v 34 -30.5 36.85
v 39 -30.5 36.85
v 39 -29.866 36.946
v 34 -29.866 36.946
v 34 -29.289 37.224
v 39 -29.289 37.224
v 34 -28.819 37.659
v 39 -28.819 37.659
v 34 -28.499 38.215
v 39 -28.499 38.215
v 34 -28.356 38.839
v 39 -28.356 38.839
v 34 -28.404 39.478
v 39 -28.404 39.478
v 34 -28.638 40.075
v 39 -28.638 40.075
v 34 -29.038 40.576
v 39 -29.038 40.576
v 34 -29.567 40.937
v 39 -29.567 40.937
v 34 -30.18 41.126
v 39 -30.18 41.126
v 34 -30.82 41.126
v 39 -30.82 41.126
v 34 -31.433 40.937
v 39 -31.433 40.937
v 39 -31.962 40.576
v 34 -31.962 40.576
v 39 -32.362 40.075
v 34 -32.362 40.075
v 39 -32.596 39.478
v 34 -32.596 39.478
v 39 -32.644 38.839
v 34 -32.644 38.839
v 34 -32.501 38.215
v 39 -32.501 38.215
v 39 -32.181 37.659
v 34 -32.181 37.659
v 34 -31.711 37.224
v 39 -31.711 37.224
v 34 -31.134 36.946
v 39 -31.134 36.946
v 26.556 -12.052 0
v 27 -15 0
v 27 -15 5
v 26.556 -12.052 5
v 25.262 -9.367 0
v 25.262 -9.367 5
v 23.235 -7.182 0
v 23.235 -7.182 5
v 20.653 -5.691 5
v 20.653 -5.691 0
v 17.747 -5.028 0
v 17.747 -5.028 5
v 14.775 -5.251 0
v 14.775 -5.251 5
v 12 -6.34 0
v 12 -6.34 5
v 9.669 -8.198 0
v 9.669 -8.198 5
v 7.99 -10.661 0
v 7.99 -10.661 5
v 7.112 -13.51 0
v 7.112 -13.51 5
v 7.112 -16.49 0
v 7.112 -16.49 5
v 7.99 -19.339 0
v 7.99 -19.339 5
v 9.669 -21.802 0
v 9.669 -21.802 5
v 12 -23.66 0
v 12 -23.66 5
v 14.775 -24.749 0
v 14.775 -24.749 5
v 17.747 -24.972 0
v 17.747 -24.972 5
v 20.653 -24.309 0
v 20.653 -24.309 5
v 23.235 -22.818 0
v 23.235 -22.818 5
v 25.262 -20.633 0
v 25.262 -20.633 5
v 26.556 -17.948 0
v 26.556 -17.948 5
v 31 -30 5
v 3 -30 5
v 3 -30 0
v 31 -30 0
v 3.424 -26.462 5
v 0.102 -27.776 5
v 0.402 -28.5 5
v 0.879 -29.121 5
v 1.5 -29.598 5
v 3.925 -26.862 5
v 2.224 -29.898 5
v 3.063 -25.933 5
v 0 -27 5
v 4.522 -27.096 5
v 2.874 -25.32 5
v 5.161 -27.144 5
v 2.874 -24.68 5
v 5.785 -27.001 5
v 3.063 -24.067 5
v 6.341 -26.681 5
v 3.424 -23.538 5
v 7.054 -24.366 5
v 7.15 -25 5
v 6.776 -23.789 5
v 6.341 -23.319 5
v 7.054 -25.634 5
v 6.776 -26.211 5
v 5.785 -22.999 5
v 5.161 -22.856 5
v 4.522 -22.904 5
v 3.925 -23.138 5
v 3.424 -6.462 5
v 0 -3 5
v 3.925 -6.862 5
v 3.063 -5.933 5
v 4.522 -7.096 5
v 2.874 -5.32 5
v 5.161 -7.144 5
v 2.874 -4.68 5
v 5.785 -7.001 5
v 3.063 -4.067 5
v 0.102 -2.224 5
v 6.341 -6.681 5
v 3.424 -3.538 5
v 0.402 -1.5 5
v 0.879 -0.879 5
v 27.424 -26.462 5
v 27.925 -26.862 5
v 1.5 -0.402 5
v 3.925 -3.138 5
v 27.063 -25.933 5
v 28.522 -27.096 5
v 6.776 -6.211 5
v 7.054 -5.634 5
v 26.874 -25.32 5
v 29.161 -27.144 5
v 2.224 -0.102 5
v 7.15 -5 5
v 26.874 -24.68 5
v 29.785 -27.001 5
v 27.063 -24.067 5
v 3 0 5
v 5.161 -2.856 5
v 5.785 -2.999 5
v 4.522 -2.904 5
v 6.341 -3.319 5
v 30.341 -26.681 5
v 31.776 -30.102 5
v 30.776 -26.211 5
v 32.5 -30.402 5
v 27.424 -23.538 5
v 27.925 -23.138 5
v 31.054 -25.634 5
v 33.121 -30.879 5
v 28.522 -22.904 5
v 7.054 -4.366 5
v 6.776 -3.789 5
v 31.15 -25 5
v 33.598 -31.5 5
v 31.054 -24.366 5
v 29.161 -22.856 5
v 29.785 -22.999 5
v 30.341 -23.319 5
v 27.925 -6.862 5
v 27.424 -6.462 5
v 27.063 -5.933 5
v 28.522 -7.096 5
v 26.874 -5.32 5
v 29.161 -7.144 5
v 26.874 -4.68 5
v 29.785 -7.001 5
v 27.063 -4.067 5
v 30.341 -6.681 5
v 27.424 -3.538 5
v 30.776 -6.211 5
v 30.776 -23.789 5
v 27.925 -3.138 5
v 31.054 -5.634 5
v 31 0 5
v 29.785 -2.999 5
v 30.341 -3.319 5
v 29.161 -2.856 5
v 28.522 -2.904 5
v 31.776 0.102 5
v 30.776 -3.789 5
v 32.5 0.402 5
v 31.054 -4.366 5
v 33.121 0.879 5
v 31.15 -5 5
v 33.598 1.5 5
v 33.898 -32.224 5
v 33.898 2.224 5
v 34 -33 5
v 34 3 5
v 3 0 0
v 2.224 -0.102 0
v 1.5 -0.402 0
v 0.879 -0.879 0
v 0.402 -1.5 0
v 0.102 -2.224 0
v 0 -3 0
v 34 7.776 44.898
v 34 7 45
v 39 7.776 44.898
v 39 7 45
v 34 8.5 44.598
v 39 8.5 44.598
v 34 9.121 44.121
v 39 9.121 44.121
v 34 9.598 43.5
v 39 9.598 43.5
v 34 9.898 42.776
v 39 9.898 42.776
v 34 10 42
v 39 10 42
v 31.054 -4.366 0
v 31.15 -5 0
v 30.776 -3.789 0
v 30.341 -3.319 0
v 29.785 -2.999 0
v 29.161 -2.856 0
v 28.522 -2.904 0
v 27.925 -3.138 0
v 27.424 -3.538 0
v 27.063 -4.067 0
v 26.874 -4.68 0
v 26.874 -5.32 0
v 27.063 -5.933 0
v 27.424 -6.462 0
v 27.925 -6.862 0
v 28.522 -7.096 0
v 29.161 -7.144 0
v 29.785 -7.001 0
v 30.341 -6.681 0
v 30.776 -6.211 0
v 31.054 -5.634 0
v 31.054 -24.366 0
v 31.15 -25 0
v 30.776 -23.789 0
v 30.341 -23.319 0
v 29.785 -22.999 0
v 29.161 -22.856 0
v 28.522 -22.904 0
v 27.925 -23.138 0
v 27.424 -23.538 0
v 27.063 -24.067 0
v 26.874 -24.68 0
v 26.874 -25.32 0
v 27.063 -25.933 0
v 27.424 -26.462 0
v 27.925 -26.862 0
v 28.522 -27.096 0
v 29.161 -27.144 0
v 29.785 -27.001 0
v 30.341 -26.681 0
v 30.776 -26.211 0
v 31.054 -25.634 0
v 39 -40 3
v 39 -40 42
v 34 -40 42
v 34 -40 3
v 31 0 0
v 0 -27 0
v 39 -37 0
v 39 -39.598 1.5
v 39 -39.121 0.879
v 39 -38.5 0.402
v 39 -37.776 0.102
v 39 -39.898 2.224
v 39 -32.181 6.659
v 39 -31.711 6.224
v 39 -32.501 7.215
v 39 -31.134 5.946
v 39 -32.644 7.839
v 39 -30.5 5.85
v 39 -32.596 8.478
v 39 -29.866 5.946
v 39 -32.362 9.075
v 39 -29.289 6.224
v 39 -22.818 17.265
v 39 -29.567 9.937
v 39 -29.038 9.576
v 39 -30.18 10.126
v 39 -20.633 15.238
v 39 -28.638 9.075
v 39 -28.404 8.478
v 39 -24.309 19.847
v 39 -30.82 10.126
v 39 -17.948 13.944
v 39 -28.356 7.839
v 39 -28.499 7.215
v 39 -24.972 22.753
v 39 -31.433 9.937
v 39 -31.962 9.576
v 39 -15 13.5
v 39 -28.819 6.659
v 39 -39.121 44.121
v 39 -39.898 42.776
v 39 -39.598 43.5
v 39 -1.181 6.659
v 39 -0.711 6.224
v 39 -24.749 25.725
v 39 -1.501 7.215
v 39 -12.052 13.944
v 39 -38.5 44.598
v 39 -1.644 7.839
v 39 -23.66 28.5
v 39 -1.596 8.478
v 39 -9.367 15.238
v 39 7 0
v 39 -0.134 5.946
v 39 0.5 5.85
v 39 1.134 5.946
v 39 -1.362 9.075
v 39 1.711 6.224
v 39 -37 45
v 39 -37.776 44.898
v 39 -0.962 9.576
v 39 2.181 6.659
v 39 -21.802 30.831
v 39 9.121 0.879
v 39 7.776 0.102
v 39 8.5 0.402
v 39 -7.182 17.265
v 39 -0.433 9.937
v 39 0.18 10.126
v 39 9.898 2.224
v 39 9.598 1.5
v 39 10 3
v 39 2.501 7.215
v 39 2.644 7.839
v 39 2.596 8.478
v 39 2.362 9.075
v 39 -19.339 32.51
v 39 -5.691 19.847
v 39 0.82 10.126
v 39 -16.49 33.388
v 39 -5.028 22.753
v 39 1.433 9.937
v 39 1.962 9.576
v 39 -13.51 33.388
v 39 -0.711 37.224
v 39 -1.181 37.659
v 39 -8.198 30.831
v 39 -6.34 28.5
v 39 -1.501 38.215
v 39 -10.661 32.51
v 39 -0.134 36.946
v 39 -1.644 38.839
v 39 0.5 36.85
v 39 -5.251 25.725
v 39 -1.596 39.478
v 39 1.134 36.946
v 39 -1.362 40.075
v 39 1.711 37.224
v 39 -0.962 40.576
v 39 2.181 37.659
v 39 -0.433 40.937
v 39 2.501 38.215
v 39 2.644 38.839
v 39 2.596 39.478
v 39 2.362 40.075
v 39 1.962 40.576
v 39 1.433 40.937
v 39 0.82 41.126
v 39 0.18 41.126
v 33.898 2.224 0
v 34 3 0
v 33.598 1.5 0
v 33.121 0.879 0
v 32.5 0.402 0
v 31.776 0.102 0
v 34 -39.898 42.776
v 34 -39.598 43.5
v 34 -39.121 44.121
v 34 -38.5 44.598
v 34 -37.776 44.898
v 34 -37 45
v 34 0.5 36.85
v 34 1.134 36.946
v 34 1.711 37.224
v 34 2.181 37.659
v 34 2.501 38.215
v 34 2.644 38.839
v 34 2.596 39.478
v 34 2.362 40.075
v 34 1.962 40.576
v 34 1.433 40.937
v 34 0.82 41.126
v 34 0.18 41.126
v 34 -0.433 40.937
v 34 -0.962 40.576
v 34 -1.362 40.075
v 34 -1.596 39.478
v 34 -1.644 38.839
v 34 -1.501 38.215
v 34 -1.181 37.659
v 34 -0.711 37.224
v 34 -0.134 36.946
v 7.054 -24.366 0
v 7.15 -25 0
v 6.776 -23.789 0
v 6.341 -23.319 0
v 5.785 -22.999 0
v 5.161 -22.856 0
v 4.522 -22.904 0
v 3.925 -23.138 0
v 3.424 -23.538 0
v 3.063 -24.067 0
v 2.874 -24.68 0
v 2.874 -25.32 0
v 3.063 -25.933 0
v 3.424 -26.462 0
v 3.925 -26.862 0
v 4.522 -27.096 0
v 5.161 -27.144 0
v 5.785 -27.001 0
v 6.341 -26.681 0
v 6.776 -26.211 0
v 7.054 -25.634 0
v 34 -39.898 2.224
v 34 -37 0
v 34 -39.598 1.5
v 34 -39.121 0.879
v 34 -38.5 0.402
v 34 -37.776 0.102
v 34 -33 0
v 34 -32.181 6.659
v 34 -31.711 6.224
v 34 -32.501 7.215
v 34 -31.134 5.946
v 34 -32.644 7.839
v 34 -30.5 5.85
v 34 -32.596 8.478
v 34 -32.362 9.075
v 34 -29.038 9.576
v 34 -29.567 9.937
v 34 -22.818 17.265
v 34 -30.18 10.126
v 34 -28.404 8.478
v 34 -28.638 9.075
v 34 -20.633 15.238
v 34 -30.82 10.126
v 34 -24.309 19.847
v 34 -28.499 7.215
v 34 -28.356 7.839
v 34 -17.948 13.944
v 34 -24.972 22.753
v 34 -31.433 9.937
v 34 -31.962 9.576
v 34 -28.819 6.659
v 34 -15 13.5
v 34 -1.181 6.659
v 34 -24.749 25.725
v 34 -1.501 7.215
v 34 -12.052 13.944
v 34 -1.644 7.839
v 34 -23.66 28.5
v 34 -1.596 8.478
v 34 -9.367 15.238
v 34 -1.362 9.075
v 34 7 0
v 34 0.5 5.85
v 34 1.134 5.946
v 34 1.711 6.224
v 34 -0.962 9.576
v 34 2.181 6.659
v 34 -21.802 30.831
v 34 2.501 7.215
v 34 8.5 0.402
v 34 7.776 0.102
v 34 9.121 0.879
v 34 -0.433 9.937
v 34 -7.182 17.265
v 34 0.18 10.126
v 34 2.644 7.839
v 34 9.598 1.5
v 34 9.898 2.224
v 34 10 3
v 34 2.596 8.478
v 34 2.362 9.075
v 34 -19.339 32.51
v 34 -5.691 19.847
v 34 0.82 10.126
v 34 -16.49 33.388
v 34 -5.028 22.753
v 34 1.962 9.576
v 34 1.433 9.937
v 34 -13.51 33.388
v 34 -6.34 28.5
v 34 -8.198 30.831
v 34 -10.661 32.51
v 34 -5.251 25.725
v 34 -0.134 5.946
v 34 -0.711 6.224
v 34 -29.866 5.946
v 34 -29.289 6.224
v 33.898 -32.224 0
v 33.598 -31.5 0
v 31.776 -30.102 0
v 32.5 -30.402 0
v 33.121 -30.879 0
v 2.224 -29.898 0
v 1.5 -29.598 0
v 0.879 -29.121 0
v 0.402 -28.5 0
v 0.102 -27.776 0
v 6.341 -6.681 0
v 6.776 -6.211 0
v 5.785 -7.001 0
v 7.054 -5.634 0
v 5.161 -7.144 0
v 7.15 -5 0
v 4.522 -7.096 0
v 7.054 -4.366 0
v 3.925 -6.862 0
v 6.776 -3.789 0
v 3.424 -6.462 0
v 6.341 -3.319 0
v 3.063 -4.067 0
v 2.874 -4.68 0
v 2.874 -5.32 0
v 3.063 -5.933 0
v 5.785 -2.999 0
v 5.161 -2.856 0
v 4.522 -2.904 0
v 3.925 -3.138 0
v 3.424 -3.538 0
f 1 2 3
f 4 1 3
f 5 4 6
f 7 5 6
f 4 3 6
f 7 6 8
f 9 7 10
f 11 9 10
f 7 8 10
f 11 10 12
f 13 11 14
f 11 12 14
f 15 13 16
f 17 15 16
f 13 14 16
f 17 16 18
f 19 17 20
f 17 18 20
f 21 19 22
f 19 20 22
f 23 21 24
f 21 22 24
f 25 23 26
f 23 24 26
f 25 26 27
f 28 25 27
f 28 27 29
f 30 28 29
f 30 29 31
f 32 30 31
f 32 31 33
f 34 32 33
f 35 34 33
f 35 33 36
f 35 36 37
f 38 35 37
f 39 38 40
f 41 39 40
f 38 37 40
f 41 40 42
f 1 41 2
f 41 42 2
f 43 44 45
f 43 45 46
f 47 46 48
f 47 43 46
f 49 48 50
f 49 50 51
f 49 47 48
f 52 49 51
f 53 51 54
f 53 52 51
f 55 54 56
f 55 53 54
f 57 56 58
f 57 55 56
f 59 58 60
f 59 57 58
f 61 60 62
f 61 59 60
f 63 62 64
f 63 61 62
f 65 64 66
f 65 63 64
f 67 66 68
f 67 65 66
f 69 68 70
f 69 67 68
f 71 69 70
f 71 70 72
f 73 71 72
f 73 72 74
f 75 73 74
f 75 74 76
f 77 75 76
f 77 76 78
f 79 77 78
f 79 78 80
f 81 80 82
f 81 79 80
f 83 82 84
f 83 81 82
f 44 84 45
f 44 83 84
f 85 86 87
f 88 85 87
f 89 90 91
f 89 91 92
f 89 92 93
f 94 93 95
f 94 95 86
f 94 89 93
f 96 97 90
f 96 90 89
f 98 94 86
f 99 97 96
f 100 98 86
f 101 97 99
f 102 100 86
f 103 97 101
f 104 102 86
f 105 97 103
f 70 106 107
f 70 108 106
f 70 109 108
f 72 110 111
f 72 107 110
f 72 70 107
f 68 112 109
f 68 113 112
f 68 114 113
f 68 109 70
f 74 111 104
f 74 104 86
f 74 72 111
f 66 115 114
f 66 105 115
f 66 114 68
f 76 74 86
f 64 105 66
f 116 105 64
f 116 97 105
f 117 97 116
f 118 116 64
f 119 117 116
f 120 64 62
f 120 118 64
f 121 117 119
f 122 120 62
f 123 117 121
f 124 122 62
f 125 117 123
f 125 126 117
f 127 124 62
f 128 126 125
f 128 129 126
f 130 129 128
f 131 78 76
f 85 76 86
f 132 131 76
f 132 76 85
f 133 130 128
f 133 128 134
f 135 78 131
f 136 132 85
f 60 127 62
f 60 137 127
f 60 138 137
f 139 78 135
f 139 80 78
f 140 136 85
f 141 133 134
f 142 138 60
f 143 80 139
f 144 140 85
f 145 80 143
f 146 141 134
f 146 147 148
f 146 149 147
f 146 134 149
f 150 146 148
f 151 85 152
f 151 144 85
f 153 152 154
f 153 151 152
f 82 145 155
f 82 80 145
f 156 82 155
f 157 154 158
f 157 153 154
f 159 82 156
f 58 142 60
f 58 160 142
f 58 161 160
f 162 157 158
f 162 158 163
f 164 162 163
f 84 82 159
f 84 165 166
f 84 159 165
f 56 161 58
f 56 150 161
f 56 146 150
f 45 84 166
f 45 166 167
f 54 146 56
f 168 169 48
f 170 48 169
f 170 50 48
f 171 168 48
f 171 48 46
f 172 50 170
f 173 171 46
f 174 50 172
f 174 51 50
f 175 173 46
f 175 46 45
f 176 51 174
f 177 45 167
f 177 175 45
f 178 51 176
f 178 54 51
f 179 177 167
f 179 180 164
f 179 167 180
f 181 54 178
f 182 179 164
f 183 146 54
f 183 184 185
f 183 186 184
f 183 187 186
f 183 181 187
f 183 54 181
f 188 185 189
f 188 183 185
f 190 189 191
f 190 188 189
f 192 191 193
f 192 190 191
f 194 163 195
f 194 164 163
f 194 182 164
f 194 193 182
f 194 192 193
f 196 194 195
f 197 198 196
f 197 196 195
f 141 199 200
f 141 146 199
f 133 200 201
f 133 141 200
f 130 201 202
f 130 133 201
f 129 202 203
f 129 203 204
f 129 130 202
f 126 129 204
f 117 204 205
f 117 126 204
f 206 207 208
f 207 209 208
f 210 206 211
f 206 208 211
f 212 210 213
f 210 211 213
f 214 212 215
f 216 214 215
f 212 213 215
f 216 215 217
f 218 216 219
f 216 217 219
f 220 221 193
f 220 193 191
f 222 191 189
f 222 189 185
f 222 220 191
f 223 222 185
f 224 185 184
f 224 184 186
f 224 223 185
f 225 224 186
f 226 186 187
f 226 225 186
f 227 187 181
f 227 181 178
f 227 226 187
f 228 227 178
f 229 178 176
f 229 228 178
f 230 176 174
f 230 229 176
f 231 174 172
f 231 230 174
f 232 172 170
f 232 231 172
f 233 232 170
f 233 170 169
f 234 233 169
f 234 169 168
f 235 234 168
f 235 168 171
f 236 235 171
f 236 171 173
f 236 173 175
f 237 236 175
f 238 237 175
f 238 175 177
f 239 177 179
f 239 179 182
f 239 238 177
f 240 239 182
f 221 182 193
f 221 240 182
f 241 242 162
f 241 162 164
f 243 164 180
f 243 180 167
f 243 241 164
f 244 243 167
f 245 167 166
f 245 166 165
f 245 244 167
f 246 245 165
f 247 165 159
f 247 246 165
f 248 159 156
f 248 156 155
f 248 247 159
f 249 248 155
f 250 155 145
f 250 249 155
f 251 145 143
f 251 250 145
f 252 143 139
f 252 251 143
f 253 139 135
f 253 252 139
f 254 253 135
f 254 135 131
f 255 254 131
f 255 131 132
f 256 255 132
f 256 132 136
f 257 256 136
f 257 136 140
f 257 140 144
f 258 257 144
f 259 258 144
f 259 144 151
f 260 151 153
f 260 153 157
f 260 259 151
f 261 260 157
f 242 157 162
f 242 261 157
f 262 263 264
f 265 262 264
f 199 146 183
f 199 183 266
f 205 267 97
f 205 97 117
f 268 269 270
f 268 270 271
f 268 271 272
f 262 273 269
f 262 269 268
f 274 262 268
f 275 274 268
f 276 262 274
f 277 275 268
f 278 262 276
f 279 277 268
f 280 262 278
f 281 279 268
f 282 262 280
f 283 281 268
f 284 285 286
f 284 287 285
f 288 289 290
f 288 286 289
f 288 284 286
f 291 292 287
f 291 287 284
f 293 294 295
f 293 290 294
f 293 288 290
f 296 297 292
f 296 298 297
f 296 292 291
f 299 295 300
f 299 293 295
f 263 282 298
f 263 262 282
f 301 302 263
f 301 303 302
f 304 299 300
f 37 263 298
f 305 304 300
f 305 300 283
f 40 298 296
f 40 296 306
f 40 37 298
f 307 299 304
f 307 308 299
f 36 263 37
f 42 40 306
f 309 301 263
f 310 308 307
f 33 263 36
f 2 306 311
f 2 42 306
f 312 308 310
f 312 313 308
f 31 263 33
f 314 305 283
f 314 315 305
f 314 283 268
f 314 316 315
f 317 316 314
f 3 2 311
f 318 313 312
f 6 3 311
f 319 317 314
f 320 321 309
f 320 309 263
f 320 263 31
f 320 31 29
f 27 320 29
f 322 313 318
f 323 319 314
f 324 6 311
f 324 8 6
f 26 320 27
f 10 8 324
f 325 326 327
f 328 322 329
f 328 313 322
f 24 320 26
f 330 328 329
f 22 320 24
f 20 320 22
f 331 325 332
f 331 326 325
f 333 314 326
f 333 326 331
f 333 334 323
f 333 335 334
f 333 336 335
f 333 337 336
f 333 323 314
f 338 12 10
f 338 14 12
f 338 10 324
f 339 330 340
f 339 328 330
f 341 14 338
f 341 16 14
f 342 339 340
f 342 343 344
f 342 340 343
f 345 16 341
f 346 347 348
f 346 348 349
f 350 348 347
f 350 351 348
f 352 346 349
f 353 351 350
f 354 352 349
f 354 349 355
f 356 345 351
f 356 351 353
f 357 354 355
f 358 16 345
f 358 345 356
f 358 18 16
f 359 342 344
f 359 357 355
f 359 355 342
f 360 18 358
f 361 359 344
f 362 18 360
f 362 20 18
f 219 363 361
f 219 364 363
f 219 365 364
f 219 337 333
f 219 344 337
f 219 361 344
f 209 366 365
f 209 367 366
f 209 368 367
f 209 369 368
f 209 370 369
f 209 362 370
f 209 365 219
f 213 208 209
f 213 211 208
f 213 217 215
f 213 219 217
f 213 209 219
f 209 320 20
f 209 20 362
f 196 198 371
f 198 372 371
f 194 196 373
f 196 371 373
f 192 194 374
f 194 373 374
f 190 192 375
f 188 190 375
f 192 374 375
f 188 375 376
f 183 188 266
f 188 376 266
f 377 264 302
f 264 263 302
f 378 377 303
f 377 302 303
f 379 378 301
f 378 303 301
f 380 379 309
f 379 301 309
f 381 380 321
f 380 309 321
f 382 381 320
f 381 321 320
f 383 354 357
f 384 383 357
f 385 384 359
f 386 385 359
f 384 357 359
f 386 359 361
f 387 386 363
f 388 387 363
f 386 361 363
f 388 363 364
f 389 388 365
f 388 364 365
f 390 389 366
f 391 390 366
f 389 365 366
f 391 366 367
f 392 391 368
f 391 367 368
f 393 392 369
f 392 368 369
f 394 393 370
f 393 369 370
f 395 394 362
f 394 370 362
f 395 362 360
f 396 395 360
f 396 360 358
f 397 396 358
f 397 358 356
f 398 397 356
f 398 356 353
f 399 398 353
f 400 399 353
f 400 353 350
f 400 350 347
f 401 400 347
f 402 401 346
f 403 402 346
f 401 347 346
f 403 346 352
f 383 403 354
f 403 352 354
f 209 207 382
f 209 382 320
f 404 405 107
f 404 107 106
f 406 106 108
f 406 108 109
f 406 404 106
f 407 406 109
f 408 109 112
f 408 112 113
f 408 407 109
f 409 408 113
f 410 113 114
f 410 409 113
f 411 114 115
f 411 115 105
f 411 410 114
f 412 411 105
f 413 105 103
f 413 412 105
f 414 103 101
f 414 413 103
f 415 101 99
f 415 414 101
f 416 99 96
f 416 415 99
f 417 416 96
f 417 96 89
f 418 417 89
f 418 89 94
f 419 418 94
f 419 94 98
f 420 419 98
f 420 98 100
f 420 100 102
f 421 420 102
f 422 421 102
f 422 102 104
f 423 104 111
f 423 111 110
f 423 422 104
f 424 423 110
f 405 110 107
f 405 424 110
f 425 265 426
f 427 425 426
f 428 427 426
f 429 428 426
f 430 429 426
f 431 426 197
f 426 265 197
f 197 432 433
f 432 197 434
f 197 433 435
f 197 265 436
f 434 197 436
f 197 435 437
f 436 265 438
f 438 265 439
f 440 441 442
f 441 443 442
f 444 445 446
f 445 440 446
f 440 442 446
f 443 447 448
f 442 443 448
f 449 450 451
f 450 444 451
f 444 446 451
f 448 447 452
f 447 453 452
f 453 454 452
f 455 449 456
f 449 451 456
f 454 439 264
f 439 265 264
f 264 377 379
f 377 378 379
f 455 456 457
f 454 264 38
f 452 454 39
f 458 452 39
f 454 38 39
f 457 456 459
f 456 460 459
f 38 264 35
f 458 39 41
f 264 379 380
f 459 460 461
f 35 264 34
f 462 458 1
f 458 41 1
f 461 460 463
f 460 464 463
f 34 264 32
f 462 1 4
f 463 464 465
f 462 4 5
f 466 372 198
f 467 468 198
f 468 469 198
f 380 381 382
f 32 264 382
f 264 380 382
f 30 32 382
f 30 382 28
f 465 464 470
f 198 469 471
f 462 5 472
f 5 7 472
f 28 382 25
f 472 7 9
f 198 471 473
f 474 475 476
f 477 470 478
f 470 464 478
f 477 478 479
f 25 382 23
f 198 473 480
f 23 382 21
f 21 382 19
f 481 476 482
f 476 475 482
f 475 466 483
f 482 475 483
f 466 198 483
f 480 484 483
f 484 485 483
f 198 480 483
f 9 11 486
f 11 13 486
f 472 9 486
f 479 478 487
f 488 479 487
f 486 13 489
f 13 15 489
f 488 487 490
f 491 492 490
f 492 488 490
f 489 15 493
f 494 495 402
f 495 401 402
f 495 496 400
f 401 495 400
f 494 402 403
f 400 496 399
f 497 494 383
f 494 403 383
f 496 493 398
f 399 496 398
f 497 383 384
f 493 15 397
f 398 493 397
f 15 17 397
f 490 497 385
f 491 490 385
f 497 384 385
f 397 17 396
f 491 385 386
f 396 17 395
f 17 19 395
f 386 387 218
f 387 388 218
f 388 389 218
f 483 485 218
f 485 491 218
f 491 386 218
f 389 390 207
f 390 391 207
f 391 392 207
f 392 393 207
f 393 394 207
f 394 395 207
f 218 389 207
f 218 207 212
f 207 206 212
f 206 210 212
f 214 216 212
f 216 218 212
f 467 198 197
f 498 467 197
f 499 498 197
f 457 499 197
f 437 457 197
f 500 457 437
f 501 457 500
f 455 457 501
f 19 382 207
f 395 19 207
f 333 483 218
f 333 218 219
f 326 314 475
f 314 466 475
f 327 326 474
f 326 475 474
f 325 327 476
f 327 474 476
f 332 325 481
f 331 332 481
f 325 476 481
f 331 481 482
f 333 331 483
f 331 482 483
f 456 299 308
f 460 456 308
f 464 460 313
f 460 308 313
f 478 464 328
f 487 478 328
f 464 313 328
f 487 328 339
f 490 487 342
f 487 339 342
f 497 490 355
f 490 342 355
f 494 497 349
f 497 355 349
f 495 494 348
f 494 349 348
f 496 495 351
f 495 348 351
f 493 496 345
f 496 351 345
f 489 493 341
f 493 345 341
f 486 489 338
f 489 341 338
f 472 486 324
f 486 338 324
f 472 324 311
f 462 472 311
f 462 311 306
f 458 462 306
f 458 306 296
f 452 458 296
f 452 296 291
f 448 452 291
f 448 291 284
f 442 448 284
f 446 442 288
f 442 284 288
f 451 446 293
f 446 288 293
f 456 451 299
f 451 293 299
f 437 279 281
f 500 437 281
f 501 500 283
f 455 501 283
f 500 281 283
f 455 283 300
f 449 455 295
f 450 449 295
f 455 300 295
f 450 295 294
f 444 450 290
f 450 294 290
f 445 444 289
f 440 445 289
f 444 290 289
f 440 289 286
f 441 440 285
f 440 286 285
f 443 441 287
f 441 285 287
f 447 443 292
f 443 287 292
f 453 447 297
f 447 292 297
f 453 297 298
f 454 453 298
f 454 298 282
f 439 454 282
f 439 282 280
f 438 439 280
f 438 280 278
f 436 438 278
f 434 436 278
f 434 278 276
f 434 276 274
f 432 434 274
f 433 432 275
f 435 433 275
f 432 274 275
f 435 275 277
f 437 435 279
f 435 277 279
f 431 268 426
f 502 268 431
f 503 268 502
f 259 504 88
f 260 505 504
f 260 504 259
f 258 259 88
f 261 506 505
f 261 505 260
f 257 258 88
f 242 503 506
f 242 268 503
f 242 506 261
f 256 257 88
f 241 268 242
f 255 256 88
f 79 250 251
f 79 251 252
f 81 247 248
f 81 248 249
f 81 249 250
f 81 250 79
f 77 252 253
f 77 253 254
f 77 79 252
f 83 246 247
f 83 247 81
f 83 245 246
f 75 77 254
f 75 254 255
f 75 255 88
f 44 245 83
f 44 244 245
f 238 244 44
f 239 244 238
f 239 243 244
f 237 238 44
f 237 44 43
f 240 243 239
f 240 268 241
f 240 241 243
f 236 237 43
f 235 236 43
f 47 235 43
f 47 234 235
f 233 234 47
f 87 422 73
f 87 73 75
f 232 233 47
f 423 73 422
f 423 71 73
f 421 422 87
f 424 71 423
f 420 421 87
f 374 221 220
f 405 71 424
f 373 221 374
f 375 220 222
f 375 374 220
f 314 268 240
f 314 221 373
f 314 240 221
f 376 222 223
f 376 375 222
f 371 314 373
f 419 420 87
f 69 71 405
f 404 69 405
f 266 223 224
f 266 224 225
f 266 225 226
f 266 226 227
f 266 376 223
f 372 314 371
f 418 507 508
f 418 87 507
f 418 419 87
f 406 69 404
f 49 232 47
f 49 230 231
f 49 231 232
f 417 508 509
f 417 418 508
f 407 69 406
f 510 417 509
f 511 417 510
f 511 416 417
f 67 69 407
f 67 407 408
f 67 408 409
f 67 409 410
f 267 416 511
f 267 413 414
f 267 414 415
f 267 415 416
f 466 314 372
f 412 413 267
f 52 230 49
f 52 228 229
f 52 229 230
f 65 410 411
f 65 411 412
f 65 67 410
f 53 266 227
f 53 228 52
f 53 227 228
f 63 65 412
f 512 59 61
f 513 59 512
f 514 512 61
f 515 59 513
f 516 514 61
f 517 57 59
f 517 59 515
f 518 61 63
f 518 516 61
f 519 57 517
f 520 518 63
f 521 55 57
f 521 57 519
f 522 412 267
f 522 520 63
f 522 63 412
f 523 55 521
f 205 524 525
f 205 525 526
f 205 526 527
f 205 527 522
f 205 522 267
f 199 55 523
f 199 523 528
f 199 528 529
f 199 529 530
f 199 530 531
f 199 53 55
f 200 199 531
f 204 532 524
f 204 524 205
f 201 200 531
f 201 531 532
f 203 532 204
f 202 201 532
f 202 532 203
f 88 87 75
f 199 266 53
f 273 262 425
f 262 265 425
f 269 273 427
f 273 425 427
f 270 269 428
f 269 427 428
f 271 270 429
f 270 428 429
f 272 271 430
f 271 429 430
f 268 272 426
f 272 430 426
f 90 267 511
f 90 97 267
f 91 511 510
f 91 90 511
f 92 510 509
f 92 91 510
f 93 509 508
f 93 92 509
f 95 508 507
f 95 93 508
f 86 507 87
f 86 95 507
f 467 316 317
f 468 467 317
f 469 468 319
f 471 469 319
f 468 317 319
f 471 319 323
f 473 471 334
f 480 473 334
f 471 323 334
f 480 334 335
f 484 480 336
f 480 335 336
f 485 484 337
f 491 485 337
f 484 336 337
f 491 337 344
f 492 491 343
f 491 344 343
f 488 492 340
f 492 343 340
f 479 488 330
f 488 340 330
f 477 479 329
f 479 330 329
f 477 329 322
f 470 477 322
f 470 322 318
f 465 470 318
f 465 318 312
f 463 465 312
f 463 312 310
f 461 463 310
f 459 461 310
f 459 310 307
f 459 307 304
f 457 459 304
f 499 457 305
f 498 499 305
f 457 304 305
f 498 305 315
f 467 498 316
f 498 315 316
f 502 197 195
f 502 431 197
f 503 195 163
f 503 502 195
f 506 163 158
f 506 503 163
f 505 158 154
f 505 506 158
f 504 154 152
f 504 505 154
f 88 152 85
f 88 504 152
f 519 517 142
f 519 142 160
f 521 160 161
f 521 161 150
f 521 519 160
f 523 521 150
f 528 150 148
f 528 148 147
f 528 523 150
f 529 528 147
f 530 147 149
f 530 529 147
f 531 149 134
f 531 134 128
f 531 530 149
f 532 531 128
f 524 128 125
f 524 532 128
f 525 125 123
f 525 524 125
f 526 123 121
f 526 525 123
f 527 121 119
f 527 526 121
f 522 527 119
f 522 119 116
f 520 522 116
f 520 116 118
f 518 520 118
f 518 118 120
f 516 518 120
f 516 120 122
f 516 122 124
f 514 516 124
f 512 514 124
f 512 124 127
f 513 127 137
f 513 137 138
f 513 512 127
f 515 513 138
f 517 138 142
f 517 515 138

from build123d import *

# Parameters (mm, degrees)
SKETCH2_W           = 34
SKETCH2_H           = 30
SKETCH2_R           = 10
SKETCH2_R_2         = 2.15
BOSS_EXTRUDE1_DEPTH = 5
SKETCH6_W           = 5
SKETCH6_H           = 50
BOSS_EXTRUDE3_DEPTH = 40
SKETCH10_W          = 5
SKETCH10_H          = 30
BOSS_EXTRUDE4_DEPTH = 5
SKETCH11_W          = 5
SKETCH11_H          = 10
BOSS_EXTRUDE5_DEPTH = 5
FILLET3_R           = 3
FILLET4_R           = 3
FILLET5_R           = 3
SKETCH12_R          = 2.15
SKETCH12_R_2        = 10
CUT_EXTRUDE3_DEPTH  = 5


with BuildPart() as part:
    # Sketch2 → Boss-Extrude1 (new body)
    with BuildSketch(Plane.XY):
        with Locations((17, -15)):
            Rectangle(SKETCH2_W, SKETCH2_H)
        with Locations((17, -15)):
            Circle(SKETCH2_R, mode=Mode.SUBTRACT)
        with Locations((29, -5)):
            Circle(SKETCH2_R_2, mode=Mode.SUBTRACT)
        with Locations((5, -5)):
            Circle(SKETCH2_R_2, mode=Mode.SUBTRACT)
        with Locations((5, -25)):
            Circle(SKETCH2_R_2, mode=Mode.SUBTRACT)
        with Locations((29, -25)):
            Circle(SKETCH2_R_2, mode=Mode.SUBTRACT)
    extrude(amount=BOSS_EXTRUDE1_DEPTH)



with BuildPart() as body_2:
    # Sketch6 → Boss-Extrude3 (new body)
    with BuildSketch(Plane.XY.offset(5)):
        with Locations((36.5, -15)):
            Rectangle(SKETCH6_W, SKETCH6_H)
    extrude(amount=BOSS_EXTRUDE3_DEPTH)


with BuildPart() as part_1:
    add(part.part)

    add(body_2.part)  # Boss-Extrude4 merges body 2
    # Sketch10 → Boss-Extrude4 (add)
    with BuildSketch(Plane(origin=(34, 0, 0), x_dir=(0, 0, -1), z_dir=(1, 0, 0))):
        with Locations((-2.5, -15)):
            Rectangle(SKETCH10_W, SKETCH10_H)
    extrude(amount=BOSS_EXTRUDE4_DEPTH)

    # Sketch11 → Boss-Extrude5 (add)
    with BuildSketch(Plane(origin=(0, 0, 5), x_dir=(-1, 0, 0), z_dir=(0, 0, -1))):
        with Locations((-36.5, -35)):
            Rectangle(SKETCH11_W, SKETCH11_H)
        with Locations((-36.5, 5)):
            Rectangle(SKETCH11_W, SKETCH11_H)
    extrude(amount=BOSS_EXTRUDE5_DEPTH)

    # Fillet3
    fillet3_edges = [part_1.edges().sort_by_distance(p)[0] for p in [
        (34, -30, 2.5),
        (34, 0, 2.5),
        (0, -30, 2.5),
        (0, 0, 2.5),
    ]]
    fillet(fillet3_edges, radius=FILLET3_R)

    # Fillet4
    fillet4_edges = [part_1.edges().sort_by_distance(p)[0] for p in [
        (36.5, -40, 0),
    ]]
    fillet(fillet4_edges, radius=FILLET4_R)

    # Fillet5
    fillet5_edges = [part_1.edges().sort_by_distance(p)[0] for p in [
        (36.5, -40, 45),
        (36.5, 10, 45),
        (36.5, 10, 0),
    ]]
    fillet(fillet5_edges, radius=FILLET5_R)

    # Sketch12 → Cut-Extrude3 (cut)
    with BuildSketch(Plane(origin=(39, 0, 0), x_dir=(0, 0, -1), z_dir=(1, 0, 0))):
        with Locations((-39, 0.5)):
            Circle(SKETCH12_R)
        with Locations((-23.5, -15)):
            Circle(SKETCH12_R_2)
        with Locations((-8, 0.5)):
            Circle(SKETCH12_R)
        with Locations((-8, -30.5)):
            Circle(SKETCH12_R)
        with Locations((-39, -30.5)):
            Circle(SKETCH12_R)
    extrude(amount=-CUT_EXTRUDE3_DEPTH, mode=Mode.SUBTRACT)


solid = part_1.part
